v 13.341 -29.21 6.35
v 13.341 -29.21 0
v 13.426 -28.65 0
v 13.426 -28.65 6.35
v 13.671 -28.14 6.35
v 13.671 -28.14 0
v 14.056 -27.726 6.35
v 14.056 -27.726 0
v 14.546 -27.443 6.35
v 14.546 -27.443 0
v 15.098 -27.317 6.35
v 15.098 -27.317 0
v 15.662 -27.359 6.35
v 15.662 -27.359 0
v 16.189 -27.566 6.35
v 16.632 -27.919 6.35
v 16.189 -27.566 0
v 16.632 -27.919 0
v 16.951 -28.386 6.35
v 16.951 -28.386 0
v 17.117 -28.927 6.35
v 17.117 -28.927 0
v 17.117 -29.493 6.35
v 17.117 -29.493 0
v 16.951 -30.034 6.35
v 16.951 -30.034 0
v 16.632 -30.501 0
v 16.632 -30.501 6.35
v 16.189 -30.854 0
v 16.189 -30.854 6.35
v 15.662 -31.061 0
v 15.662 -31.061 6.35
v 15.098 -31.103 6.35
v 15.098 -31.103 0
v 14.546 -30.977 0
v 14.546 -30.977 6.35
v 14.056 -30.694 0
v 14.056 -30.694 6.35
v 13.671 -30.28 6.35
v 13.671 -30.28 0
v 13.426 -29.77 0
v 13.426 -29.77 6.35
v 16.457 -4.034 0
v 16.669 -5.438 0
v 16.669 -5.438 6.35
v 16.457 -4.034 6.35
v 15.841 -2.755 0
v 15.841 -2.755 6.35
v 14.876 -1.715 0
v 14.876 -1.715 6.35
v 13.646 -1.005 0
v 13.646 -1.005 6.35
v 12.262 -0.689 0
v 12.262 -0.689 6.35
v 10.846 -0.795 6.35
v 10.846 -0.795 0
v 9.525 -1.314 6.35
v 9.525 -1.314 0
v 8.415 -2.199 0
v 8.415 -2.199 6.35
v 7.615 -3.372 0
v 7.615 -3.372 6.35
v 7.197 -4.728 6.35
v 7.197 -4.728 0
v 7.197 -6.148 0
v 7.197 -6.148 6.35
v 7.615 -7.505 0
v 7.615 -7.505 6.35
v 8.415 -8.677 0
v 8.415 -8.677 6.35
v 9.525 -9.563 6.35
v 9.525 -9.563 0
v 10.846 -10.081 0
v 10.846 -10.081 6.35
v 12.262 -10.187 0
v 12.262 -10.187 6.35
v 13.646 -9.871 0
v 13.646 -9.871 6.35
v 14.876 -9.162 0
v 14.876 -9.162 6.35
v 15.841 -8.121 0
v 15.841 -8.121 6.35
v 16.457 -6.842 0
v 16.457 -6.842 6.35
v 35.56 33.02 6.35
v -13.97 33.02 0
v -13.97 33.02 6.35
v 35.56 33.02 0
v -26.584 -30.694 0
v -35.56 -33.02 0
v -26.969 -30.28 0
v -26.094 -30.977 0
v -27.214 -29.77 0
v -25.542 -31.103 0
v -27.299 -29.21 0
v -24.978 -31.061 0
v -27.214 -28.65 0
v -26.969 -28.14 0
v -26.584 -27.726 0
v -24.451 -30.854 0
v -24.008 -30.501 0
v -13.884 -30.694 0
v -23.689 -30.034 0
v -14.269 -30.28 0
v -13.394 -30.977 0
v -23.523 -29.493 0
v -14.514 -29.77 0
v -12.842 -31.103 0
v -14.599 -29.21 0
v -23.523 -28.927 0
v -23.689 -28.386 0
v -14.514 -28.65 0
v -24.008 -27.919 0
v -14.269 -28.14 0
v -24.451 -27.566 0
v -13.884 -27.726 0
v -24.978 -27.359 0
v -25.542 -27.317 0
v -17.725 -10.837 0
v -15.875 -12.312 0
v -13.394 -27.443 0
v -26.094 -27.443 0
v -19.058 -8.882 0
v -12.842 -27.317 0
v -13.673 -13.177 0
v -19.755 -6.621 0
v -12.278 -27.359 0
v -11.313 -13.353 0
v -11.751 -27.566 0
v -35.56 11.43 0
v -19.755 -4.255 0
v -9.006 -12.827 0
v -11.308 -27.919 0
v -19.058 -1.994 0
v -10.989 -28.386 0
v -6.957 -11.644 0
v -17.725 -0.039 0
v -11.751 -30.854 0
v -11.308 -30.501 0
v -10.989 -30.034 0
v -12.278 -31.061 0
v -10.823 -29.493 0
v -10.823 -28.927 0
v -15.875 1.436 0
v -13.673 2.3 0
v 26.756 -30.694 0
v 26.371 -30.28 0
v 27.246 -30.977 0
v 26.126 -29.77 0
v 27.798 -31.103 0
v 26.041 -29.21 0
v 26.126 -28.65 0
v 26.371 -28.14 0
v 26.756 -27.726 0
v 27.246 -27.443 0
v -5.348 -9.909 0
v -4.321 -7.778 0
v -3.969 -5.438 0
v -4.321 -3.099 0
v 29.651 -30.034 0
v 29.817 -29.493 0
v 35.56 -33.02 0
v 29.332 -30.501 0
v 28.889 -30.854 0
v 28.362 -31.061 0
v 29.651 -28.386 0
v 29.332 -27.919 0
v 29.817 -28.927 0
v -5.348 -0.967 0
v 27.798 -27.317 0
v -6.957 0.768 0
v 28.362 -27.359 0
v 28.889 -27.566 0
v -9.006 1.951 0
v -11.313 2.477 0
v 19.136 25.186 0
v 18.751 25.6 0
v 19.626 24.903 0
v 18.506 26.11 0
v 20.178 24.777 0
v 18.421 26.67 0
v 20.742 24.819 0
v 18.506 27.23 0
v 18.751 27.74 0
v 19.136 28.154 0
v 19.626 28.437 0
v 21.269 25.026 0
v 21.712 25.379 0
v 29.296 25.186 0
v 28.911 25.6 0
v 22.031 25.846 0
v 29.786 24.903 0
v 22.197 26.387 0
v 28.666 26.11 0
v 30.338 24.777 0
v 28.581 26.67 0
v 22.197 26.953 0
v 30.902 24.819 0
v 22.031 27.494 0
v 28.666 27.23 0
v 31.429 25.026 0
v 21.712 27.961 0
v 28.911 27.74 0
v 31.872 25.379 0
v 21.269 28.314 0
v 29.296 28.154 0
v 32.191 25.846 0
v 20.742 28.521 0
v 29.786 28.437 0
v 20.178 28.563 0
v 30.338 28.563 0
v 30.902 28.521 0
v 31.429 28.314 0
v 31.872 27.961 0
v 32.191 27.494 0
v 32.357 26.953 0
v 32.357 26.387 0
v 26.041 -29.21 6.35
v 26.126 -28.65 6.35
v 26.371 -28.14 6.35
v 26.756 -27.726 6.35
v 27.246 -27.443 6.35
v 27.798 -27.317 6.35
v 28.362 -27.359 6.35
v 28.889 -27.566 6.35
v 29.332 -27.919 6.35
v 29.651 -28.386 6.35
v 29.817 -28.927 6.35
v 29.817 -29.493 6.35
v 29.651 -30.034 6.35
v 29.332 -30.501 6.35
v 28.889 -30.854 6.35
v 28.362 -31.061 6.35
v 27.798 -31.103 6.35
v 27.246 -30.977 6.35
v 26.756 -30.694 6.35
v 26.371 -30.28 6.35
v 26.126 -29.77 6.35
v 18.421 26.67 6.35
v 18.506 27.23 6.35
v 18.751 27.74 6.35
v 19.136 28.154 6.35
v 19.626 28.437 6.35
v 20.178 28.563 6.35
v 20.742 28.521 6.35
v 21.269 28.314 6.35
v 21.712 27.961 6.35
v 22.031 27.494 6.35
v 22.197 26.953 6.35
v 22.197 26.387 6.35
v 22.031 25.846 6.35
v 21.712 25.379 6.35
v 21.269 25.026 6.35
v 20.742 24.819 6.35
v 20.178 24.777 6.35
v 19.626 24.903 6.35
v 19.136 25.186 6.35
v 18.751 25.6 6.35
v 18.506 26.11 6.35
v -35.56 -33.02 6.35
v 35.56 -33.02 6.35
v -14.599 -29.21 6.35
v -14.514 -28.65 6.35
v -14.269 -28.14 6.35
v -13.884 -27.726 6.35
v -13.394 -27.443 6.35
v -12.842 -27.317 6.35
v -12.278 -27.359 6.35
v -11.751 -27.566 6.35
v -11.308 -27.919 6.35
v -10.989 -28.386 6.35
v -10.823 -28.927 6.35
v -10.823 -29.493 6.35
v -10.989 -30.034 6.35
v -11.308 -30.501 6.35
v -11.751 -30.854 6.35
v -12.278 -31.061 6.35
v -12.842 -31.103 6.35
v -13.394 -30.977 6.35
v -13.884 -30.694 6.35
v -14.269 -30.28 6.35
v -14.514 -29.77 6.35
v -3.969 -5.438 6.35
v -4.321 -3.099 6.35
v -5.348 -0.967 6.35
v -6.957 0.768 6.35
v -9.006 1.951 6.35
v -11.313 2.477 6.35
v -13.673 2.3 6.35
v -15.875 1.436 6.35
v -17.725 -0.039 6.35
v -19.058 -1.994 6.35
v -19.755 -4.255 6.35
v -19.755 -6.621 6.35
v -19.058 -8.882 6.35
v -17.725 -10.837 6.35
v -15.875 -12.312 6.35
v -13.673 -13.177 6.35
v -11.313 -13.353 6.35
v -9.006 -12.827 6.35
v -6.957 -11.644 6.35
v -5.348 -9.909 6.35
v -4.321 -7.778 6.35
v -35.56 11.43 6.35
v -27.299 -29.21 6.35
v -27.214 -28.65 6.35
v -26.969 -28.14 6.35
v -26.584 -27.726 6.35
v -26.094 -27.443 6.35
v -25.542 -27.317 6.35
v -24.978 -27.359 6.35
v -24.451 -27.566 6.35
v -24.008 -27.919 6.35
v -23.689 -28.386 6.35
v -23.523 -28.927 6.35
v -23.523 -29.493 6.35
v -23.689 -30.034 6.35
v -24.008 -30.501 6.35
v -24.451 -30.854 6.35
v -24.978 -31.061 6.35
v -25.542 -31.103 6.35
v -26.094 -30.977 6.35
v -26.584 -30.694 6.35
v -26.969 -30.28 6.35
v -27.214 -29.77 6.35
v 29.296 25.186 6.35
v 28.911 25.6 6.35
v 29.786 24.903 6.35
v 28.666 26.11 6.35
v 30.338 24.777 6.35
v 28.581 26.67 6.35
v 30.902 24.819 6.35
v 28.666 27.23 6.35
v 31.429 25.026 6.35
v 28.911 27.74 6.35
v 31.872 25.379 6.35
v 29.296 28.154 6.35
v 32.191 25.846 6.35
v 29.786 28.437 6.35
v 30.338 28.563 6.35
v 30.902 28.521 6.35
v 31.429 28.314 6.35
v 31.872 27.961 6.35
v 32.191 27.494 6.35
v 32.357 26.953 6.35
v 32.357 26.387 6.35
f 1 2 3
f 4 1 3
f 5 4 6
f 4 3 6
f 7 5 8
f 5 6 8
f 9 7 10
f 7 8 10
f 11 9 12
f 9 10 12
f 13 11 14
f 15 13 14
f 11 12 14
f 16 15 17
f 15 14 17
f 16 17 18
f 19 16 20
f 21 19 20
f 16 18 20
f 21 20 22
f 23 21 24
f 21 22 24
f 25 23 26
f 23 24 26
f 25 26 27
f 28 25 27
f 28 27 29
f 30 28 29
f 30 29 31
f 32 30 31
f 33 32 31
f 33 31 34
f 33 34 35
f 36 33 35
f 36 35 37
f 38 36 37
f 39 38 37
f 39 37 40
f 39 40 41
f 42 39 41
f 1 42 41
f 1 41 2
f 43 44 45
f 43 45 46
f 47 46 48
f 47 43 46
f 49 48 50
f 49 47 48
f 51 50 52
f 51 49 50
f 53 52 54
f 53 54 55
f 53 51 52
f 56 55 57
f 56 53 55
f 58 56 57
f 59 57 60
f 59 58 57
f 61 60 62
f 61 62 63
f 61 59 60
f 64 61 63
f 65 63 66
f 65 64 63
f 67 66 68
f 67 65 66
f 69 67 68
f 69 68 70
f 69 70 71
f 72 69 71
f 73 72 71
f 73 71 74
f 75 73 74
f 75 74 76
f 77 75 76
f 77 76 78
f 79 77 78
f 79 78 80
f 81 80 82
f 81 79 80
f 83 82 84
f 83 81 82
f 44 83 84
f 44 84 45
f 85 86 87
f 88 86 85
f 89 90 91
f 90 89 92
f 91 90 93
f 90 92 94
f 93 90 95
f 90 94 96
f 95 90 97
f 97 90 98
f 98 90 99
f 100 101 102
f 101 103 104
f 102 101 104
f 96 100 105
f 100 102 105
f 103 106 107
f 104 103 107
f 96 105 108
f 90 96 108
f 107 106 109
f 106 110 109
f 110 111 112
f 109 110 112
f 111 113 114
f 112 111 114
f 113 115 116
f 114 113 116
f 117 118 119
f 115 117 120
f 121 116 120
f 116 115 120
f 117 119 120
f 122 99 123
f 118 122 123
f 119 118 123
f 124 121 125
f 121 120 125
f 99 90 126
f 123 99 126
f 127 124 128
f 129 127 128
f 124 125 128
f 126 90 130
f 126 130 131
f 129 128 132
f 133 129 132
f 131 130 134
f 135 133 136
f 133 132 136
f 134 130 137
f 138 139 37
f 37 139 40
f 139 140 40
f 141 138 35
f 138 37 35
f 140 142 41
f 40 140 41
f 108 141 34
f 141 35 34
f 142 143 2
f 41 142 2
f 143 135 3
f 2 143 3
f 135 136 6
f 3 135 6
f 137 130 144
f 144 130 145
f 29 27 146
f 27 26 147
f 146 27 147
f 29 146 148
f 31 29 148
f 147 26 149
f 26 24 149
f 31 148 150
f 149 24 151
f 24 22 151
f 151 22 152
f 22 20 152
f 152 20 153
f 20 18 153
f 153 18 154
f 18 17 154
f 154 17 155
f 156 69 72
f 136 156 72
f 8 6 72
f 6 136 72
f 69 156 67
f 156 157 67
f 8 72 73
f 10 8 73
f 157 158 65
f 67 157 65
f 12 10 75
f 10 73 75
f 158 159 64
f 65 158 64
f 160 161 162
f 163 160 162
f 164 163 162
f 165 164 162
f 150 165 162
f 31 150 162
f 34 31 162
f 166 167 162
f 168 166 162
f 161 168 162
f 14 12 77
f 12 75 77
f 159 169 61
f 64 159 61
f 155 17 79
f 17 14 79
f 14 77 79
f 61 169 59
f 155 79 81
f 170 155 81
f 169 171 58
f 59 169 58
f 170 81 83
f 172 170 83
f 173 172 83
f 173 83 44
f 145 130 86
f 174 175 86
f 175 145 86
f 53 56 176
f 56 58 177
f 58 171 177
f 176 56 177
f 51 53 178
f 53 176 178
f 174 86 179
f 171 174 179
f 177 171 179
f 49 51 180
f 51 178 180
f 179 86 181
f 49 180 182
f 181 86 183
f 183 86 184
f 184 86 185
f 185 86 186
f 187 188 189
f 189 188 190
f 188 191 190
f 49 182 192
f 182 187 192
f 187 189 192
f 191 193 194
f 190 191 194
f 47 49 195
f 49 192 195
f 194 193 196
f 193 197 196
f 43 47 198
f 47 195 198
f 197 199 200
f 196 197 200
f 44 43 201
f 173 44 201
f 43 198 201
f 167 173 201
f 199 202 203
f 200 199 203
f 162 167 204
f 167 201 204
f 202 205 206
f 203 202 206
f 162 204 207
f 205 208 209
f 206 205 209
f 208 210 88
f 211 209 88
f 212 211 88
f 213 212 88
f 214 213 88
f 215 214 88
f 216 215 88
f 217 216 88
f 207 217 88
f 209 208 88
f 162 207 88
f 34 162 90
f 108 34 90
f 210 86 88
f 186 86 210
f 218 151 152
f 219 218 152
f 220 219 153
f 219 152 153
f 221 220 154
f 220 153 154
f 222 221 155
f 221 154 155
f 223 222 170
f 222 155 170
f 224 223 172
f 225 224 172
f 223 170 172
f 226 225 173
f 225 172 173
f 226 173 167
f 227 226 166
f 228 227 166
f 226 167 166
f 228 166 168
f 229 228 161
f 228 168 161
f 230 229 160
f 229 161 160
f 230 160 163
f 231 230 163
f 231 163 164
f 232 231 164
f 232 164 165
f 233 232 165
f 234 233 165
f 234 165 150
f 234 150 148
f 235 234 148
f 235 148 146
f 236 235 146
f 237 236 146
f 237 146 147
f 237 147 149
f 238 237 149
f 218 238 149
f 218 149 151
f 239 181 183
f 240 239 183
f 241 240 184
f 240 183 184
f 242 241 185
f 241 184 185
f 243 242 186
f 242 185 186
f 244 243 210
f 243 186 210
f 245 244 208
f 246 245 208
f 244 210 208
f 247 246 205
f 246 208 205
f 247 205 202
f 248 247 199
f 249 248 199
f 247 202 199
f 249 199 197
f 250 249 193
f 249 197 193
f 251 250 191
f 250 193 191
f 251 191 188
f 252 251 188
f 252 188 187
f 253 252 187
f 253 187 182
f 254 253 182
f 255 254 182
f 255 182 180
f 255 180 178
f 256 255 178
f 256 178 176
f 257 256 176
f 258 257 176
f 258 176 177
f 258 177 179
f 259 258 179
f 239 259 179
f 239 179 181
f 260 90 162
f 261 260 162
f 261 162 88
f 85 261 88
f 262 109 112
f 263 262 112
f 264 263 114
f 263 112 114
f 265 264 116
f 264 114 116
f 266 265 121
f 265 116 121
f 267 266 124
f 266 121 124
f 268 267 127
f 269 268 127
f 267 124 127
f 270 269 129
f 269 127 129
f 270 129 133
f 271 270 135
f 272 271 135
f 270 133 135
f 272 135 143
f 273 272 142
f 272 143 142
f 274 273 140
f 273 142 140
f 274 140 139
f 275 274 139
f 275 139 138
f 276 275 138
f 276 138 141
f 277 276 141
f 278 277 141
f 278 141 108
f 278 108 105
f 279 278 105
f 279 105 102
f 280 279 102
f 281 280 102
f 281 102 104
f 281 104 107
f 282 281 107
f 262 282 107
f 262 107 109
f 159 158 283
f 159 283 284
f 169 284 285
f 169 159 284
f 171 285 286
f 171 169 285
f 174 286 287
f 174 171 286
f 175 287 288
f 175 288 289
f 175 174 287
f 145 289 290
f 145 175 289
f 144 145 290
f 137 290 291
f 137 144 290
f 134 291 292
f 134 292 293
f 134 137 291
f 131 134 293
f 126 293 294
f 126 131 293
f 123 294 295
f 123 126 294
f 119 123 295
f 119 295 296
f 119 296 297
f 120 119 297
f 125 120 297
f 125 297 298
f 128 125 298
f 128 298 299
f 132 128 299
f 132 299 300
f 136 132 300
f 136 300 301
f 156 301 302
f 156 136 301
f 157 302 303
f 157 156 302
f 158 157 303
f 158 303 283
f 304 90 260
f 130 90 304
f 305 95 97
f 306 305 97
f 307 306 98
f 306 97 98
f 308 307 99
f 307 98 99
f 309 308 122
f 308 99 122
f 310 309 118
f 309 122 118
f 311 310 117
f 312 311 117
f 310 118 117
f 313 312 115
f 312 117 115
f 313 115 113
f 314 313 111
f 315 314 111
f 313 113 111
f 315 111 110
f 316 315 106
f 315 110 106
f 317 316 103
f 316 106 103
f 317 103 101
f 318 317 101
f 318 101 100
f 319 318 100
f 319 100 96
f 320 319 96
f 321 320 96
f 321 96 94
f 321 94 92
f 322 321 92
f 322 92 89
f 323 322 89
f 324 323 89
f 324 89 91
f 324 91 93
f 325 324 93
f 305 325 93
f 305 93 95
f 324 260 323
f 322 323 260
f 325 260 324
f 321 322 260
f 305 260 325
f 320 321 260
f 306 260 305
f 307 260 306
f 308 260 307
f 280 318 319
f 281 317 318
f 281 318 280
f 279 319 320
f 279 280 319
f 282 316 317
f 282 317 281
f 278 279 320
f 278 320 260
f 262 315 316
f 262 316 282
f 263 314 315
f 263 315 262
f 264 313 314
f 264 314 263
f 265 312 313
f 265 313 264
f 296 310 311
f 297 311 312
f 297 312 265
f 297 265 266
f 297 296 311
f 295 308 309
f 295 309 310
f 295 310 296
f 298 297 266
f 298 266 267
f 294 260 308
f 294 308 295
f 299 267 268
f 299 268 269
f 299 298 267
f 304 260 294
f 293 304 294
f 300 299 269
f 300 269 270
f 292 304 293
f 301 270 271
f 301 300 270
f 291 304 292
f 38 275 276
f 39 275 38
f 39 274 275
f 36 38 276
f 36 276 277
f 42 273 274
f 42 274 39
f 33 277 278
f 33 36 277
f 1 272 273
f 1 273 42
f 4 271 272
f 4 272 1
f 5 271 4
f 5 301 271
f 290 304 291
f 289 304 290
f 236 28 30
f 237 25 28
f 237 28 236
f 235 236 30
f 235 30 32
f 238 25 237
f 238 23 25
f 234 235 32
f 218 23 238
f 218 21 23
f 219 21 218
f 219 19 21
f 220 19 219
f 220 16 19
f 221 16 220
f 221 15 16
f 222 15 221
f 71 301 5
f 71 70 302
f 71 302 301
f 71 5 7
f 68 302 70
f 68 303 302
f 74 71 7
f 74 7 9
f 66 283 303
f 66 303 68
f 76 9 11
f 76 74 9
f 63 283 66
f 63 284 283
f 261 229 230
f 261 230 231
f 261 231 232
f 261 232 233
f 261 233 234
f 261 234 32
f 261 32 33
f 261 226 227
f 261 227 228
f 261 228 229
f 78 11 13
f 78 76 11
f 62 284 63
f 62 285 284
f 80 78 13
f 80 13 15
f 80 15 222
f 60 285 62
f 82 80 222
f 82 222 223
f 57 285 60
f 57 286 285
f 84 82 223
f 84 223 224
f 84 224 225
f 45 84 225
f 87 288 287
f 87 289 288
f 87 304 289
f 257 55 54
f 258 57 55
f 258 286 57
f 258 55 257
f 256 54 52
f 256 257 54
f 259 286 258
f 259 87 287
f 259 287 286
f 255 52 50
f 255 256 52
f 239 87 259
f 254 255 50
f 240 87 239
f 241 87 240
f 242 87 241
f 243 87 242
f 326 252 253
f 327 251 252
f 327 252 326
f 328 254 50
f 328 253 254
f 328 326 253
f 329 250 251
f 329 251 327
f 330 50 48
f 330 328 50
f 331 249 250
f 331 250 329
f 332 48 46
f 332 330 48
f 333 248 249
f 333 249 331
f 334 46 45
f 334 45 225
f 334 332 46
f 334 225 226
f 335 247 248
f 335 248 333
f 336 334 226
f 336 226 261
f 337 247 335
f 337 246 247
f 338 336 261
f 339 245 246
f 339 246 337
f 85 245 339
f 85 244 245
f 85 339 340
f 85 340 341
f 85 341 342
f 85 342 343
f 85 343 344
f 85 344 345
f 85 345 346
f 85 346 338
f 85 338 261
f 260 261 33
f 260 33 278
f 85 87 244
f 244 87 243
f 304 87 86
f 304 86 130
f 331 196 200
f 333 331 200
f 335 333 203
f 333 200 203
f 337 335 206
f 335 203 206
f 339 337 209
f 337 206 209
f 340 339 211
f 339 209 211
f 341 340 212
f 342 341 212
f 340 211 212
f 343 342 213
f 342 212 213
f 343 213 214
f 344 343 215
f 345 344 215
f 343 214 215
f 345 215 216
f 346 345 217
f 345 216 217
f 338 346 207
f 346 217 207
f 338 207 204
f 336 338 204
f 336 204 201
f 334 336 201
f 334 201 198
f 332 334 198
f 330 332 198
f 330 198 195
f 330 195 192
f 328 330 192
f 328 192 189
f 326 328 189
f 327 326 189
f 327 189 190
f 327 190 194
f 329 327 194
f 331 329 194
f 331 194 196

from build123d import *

# Parameters (mm, degrees)
SKETCH1_W             = 71.12
SKETCH1_H             = 66.04
SKETCH1_R             = 7.9375
SKETCH1_R_2           = 4.7625
BOSS_EXTRUDE1_DEPTH   = 6.35
F_6_CLEARANCE_HOLE1_D = 3.7973
CUT_EXTRUDE1_DEPTH    = 49.940336125
F_6_CLEARANCE_HOLE2_D = 3.7973


with BuildPart() as part:
    # Sketch1 → Boss-Extrude1 (new body)
    with BuildSketch(Plane.XY):
        Rectangle(SKETCH1_W, SKETCH1_H)
        with Locations((-11.90625, -5.43814)):
            Circle(SKETCH1_R, mode=Mode.SUBTRACT)
        with Locations((11.90625, -5.43814)):
            Circle(SKETCH1_R_2, mode=Mode.SUBTRACT)
    extrude(amount=BOSS_EXTRUDE1_DEPTH)

    # #6 Clearance Hole1 (through all)
    with Locations(Plane.XY.offset(6.35)):
        with Locations((-25.4, -29.21), (-12.7, -29.21), (15.24, -29.21), (27.94, -29.21)):
            Hole(F_6_CLEARANCE_HOLE1_D / 2)

    # Sketch4 → Cut-Extrude1 (cut, through all)
    with BuildSketch(Plane.XY.offset(6.35)):
        Polygon((-35.56, 11.43), (-35.56, 33.02), (-13.97, 33.02), align=None)
    extrude(amount=-CUT_EXTRUDE1_DEPTH, mode=Mode.SUBTRACT)

    # #6 Clearance Hole2 (through all)
    with Locations(Plane.XY.offset(6.35)):
        with Locations((20.32, 26.67), (30.48, 26.67)):
            Hole(F_6_CLEARANCE_HOLE2_D / 2)


solid = part.part
